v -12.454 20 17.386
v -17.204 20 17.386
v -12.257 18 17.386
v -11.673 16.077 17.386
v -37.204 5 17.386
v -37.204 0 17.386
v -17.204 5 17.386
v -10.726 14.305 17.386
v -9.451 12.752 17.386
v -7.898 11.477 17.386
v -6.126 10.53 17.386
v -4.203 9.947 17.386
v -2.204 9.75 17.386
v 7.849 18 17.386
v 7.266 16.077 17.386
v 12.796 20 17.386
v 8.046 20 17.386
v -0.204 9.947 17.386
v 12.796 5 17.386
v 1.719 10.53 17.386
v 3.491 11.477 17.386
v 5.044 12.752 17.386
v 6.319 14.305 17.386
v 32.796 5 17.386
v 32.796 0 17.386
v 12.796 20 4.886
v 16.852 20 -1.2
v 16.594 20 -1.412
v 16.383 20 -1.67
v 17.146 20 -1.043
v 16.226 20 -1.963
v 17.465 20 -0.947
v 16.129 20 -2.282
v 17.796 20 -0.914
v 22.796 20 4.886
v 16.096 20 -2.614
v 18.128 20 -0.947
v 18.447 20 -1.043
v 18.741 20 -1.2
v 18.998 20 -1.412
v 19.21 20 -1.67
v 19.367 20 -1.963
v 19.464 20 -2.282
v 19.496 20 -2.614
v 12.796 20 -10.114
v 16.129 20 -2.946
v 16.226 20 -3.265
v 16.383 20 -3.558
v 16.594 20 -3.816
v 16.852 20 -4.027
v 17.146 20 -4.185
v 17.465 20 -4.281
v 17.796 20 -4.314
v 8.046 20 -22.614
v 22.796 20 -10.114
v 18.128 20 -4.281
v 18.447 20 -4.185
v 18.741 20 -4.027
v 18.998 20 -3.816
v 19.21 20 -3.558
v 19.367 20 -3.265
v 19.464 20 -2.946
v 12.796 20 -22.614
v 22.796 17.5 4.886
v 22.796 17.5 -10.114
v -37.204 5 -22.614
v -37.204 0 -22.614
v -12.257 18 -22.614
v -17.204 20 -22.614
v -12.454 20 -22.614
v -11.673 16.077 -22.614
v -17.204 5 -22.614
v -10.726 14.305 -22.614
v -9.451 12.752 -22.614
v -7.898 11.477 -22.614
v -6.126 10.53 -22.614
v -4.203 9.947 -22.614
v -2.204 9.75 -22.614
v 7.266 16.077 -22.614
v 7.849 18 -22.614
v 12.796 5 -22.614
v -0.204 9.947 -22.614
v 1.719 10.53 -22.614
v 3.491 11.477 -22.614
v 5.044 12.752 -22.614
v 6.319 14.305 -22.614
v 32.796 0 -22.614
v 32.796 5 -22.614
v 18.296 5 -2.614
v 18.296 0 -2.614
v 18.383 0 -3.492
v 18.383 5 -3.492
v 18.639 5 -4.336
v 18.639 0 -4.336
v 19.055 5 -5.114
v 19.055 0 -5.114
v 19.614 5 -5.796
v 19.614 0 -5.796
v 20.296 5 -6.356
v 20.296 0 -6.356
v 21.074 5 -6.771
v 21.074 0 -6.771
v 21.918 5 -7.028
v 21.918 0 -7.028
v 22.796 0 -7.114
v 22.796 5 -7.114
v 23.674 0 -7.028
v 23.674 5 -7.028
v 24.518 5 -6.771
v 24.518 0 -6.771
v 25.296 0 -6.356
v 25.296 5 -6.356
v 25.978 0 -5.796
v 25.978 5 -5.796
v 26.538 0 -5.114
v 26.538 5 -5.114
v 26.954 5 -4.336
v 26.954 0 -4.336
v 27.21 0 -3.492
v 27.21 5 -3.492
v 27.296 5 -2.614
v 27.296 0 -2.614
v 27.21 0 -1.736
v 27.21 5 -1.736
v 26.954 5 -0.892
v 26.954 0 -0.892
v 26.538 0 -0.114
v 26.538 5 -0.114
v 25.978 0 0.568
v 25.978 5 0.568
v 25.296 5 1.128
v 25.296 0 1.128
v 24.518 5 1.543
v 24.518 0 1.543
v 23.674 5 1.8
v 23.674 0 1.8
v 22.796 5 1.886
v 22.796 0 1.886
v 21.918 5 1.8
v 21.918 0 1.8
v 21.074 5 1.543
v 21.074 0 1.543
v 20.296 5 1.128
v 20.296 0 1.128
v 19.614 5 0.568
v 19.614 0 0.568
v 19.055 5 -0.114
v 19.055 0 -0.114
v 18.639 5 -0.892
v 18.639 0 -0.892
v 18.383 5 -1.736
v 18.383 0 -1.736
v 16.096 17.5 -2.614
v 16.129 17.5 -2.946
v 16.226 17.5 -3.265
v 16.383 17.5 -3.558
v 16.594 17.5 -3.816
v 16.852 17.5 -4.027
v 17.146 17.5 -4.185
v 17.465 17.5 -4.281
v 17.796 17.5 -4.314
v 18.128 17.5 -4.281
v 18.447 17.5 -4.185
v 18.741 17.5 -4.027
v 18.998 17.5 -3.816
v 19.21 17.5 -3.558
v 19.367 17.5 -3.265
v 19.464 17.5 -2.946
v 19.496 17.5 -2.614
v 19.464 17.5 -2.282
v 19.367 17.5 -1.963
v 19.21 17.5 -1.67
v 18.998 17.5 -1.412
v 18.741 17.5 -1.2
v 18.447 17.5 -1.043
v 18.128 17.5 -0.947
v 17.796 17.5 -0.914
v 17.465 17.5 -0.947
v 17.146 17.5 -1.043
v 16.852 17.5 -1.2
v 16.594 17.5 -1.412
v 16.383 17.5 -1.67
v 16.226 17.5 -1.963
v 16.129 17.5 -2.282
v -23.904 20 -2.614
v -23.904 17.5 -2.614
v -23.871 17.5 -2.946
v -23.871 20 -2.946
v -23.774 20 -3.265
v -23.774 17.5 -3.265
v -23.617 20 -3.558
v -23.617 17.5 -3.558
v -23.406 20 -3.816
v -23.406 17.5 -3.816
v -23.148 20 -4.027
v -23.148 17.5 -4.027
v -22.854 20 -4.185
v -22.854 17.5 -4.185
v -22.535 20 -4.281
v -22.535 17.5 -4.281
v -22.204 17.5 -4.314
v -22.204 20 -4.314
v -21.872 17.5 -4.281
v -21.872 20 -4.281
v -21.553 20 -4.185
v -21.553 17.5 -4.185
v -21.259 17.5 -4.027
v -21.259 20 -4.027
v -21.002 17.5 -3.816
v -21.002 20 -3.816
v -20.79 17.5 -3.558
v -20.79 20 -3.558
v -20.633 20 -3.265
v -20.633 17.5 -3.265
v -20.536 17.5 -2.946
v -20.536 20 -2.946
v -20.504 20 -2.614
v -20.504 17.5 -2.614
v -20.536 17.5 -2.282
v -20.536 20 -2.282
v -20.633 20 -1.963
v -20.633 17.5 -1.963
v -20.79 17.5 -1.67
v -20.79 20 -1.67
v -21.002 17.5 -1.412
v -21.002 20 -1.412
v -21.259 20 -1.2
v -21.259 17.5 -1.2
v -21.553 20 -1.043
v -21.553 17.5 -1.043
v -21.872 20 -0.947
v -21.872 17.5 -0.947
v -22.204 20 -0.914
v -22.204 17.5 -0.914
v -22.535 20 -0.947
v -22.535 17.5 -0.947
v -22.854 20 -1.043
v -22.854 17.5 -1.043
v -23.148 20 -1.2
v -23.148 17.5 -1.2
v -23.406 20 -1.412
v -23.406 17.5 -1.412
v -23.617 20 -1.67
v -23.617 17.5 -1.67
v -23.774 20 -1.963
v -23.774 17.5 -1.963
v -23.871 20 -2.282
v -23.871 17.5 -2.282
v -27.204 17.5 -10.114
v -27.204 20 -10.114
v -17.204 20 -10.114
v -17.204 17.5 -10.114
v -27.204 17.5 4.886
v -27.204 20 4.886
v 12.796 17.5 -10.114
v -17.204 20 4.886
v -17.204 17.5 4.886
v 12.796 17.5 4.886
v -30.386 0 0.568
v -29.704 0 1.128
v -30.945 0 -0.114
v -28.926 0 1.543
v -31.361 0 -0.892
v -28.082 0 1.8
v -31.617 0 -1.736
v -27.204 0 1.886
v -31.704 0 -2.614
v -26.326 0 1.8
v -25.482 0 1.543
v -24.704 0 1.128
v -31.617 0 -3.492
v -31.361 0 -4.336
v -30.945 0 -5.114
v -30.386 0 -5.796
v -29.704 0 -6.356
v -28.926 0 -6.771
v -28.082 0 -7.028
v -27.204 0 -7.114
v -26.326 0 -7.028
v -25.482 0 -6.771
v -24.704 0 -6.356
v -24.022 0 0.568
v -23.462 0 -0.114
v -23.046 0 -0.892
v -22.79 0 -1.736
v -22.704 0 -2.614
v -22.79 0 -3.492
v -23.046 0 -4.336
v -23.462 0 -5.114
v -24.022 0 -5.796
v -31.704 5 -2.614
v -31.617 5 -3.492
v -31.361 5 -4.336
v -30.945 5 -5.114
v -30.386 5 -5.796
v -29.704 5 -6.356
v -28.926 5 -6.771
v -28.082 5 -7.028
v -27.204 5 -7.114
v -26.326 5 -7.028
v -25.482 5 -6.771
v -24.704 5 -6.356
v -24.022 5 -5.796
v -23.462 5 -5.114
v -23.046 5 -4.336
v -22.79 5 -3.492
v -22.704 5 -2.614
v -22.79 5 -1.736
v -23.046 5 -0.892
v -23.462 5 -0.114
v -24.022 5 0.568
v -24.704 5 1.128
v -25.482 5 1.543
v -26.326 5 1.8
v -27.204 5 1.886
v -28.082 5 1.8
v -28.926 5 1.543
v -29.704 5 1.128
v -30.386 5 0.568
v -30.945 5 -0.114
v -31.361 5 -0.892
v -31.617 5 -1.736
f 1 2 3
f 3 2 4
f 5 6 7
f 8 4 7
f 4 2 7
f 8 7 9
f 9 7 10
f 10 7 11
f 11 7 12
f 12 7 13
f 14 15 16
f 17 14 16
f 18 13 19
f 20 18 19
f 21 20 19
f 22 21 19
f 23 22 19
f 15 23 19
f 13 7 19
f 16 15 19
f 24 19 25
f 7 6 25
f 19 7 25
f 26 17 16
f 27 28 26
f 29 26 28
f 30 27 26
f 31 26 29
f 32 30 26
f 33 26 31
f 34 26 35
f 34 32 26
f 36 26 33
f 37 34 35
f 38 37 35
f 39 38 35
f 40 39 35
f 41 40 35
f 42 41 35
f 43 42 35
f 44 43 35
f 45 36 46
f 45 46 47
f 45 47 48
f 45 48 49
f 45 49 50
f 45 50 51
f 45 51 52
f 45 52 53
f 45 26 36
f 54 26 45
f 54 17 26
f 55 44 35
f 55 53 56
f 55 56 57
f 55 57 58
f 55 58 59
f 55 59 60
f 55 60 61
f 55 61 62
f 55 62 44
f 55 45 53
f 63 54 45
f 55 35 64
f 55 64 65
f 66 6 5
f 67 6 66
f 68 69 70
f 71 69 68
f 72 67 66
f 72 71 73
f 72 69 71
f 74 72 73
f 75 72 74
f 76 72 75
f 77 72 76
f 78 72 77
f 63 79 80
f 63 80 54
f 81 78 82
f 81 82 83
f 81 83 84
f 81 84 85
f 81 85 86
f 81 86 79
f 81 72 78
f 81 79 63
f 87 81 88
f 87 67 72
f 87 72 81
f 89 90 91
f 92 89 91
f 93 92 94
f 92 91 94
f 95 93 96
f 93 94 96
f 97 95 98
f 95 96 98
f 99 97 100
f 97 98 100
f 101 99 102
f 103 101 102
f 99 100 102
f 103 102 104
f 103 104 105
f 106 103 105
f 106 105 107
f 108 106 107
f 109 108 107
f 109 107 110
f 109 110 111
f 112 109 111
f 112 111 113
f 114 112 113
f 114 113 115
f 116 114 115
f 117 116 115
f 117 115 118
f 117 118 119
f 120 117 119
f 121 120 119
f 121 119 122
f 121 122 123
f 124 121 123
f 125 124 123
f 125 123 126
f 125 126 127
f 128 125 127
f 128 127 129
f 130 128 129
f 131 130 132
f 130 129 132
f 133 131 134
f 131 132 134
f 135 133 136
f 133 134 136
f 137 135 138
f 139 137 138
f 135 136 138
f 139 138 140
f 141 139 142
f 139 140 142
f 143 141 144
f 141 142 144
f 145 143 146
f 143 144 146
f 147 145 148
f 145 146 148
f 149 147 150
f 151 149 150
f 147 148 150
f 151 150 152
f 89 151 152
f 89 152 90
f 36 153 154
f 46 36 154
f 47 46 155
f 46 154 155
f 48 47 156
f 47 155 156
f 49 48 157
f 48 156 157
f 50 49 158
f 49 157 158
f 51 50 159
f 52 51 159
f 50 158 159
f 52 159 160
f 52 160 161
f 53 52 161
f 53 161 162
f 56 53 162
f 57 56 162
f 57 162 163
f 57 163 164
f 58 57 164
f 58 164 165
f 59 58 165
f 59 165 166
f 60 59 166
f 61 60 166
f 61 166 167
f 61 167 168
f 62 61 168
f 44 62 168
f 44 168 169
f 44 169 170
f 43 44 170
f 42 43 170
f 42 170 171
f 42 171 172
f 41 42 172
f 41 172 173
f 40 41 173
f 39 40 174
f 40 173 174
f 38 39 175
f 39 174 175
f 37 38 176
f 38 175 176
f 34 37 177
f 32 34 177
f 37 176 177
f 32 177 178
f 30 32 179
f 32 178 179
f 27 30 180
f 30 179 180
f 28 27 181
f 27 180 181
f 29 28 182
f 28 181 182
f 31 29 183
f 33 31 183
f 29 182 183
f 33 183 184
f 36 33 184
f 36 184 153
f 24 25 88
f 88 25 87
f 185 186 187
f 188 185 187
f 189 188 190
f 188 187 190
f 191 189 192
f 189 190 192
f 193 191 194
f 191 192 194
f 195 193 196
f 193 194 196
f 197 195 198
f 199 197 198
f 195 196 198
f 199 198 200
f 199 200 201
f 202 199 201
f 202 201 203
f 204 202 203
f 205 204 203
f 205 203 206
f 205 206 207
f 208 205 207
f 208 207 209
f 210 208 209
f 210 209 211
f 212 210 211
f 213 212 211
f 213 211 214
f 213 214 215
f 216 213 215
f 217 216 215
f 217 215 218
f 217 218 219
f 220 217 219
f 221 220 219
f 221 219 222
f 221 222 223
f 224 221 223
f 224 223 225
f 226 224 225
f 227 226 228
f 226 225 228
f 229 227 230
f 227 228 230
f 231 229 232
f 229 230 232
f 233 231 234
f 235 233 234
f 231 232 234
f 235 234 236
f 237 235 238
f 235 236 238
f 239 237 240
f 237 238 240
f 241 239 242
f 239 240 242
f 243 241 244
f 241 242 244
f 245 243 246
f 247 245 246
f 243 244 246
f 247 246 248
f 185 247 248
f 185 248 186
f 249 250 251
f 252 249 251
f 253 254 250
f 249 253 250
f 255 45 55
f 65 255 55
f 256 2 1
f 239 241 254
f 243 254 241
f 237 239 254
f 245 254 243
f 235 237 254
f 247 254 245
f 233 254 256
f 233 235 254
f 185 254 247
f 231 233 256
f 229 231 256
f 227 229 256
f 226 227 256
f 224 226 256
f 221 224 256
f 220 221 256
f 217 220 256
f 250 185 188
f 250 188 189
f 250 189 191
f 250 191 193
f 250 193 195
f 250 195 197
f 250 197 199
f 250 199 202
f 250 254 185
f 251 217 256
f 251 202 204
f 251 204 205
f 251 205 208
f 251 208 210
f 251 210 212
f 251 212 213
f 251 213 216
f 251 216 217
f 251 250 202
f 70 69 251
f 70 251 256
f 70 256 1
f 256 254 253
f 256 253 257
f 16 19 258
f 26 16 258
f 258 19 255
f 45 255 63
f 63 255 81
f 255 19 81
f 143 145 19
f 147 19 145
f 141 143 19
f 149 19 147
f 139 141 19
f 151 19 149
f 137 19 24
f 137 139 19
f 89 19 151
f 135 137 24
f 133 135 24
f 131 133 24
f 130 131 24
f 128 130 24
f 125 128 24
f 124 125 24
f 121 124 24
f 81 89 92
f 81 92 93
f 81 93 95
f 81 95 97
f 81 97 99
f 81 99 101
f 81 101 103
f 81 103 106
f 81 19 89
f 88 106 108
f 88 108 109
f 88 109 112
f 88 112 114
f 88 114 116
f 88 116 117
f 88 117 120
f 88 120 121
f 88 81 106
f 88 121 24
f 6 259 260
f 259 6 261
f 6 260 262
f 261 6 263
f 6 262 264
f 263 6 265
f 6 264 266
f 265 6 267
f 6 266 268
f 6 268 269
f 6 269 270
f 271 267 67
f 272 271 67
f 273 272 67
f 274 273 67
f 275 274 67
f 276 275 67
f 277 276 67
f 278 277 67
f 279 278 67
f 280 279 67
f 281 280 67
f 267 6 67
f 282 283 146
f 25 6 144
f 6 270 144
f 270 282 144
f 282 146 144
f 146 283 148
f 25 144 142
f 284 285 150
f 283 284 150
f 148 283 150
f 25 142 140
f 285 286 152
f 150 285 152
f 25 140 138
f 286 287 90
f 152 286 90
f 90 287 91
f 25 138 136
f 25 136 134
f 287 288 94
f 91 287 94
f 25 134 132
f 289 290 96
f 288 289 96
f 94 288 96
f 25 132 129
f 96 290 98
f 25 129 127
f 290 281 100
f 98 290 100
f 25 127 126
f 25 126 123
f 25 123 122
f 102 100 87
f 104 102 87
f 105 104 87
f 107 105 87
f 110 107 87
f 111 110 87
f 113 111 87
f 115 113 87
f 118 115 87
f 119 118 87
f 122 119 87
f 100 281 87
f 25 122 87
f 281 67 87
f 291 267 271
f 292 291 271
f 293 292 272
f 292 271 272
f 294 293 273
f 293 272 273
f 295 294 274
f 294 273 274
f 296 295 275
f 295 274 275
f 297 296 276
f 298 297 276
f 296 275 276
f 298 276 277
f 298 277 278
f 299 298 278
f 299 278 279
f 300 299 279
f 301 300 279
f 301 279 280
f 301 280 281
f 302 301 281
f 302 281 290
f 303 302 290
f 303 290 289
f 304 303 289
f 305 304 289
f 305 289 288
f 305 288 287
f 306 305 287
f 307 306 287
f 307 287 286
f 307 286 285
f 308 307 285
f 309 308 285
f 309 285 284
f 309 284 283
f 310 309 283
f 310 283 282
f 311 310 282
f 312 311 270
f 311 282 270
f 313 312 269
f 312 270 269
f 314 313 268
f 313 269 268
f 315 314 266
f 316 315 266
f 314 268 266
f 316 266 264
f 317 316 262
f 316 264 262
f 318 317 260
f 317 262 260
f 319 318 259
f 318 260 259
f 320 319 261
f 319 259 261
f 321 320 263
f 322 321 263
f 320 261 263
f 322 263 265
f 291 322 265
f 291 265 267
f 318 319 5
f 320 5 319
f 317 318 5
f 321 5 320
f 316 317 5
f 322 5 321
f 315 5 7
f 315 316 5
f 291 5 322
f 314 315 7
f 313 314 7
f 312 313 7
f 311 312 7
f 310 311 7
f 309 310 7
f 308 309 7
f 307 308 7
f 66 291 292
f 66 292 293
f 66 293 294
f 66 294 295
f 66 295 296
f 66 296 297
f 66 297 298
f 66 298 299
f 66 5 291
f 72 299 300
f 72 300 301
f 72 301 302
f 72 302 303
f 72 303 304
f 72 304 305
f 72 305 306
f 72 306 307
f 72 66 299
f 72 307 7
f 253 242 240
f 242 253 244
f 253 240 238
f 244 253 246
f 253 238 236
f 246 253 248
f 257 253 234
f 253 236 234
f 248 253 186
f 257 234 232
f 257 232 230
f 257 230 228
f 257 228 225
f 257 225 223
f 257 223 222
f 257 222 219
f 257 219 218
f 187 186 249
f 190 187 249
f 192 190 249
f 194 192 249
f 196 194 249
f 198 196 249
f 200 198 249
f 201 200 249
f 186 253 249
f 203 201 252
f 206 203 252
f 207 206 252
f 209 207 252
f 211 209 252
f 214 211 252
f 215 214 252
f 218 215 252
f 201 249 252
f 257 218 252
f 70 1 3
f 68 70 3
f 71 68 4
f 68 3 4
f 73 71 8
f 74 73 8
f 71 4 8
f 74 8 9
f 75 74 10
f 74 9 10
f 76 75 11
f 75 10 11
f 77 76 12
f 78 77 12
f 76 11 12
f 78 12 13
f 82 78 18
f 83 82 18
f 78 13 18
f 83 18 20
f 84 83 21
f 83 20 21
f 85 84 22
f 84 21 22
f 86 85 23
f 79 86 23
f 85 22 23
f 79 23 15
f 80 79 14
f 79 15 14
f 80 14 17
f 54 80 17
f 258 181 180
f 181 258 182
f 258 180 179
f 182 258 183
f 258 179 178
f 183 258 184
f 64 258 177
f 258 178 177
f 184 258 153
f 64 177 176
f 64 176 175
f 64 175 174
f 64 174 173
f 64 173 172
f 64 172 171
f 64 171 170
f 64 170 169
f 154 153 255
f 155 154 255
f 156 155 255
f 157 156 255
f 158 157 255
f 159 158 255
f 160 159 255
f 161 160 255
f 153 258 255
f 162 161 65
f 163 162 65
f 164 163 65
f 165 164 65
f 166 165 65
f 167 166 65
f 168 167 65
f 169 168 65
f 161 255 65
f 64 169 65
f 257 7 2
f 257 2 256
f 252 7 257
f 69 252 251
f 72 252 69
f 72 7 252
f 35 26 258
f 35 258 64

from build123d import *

# Parameters (mm, degrees)
SKETCH1_W                = 70
SKETCH1_H                = 40
BOSS_EXTRUDE1_DEPTH      = 5
SKETCH2_W                = 30
SKETCH2_H                = 40
BOSS_EXTRUDE2_DEPTH      = 15
SKETCH3_R                = 10.25
CUT_EXTRUDE1_DEPTH       = 41
SKETCH5_W                = 10
SKETCH5_H                = 15
BOSS_EXTRUDE3_DEPTH      = 2.5
SKETCH6_W                = 10
SKETCH6_H                = 15
BOSS_EXTRUDE4_DEPTH      = 2.5
M3_CLEARANCE_HOLE1_D     = 3.4
M3_CLEARANCE_HOLE1_DEPTH = 2.5
M8_CLEARANCE_HOLE1_D     = 9
M8_CLEARANCE_HOLE1_DEPTH = 5


with BuildPart() as part:
    # Sketch1 → Boss-Extrude1 (new body)
    with BuildSketch(Plane(origin=(0, 0, 0), x_dir=(1, 0, 0), z_dir=(0, 1, 0))):
        with Locations((-2.203647416, 2.613981763)):
            Rectangle(SKETCH1_W, SKETCH1_H)
    extrude(amount=BOSS_EXTRUDE1_DEPTH)

    # Sketch2 → Boss-Extrude2 (add)
    with BuildSketch(Plane(origin=(0, 5, 0), x_dir=(1, 0, 0), z_dir=(0, 1, 0))):
        with Locations((-2.203647416, 2.613981763)):
            Rectangle(SKETCH2_W, SKETCH2_H)
    extrude(amount=BOSS_EXTRUDE2_DEPTH)

    # Sketch3 → Cut-Extrude1 (cut, through all)
    with BuildSketch(Plane.XY.offset(17.386018237)):
        with Locations((-2.203647416, 20)):
            Circle(SKETCH3_R)
    extrude(amount=-CUT_EXTRUDE1_DEPTH, mode=Mode.SUBTRACT)

    # Sketch5 → Boss-Extrude3 (add)
    with BuildSketch(Plane(origin=(0, 20, 0), x_dir=(1, 0, 0), z_dir=(0, 1, 0))):
        with Locations((-22.203647416, 2.613981763)):
            Rectangle(SKETCH5_W, SKETCH5_H)
    extrude(amount=-BOSS_EXTRUDE3_DEPTH)

    # Sketch6 → Boss-Extrude4 (add)
    with BuildSketch(Plane(origin=(0, 20, 0), x_dir=(1, 0, 0), z_dir=(0, 1, 0))):
        with Locations((17.796352584, 2.613981763)):
            Rectangle(SKETCH6_W, SKETCH6_H)
    extrude(amount=-BOSS_EXTRUDE4_DEPTH)

    # M3 Clearance Hole1
    with Locations(Plane(origin=(0, 20, 0), x_dir=(1, 0, 0), z_dir=(0, 1, 0))):
        with Locations((17.796352584, 2.613981763), (-22.203647416, 2.613981763)):
            Hole(M3_CLEARANCE_HOLE1_D / 2, depth=M3_CLEARANCE_HOLE1_DEPTH)

    # M8 Clearance Hole1
    with Locations(Plane(origin=(0, 5, 0), x_dir=(1, 0, 0), z_dir=(0, 1, 0))):
        with Locations((22.796352584, 2.613981763), (-27.203647416, 2.613981763)):
            Hole(M8_CLEARANCE_HOLE1_D / 2, depth=M8_CLEARANCE_HOLE1_DEPTH)


solid = part.part
